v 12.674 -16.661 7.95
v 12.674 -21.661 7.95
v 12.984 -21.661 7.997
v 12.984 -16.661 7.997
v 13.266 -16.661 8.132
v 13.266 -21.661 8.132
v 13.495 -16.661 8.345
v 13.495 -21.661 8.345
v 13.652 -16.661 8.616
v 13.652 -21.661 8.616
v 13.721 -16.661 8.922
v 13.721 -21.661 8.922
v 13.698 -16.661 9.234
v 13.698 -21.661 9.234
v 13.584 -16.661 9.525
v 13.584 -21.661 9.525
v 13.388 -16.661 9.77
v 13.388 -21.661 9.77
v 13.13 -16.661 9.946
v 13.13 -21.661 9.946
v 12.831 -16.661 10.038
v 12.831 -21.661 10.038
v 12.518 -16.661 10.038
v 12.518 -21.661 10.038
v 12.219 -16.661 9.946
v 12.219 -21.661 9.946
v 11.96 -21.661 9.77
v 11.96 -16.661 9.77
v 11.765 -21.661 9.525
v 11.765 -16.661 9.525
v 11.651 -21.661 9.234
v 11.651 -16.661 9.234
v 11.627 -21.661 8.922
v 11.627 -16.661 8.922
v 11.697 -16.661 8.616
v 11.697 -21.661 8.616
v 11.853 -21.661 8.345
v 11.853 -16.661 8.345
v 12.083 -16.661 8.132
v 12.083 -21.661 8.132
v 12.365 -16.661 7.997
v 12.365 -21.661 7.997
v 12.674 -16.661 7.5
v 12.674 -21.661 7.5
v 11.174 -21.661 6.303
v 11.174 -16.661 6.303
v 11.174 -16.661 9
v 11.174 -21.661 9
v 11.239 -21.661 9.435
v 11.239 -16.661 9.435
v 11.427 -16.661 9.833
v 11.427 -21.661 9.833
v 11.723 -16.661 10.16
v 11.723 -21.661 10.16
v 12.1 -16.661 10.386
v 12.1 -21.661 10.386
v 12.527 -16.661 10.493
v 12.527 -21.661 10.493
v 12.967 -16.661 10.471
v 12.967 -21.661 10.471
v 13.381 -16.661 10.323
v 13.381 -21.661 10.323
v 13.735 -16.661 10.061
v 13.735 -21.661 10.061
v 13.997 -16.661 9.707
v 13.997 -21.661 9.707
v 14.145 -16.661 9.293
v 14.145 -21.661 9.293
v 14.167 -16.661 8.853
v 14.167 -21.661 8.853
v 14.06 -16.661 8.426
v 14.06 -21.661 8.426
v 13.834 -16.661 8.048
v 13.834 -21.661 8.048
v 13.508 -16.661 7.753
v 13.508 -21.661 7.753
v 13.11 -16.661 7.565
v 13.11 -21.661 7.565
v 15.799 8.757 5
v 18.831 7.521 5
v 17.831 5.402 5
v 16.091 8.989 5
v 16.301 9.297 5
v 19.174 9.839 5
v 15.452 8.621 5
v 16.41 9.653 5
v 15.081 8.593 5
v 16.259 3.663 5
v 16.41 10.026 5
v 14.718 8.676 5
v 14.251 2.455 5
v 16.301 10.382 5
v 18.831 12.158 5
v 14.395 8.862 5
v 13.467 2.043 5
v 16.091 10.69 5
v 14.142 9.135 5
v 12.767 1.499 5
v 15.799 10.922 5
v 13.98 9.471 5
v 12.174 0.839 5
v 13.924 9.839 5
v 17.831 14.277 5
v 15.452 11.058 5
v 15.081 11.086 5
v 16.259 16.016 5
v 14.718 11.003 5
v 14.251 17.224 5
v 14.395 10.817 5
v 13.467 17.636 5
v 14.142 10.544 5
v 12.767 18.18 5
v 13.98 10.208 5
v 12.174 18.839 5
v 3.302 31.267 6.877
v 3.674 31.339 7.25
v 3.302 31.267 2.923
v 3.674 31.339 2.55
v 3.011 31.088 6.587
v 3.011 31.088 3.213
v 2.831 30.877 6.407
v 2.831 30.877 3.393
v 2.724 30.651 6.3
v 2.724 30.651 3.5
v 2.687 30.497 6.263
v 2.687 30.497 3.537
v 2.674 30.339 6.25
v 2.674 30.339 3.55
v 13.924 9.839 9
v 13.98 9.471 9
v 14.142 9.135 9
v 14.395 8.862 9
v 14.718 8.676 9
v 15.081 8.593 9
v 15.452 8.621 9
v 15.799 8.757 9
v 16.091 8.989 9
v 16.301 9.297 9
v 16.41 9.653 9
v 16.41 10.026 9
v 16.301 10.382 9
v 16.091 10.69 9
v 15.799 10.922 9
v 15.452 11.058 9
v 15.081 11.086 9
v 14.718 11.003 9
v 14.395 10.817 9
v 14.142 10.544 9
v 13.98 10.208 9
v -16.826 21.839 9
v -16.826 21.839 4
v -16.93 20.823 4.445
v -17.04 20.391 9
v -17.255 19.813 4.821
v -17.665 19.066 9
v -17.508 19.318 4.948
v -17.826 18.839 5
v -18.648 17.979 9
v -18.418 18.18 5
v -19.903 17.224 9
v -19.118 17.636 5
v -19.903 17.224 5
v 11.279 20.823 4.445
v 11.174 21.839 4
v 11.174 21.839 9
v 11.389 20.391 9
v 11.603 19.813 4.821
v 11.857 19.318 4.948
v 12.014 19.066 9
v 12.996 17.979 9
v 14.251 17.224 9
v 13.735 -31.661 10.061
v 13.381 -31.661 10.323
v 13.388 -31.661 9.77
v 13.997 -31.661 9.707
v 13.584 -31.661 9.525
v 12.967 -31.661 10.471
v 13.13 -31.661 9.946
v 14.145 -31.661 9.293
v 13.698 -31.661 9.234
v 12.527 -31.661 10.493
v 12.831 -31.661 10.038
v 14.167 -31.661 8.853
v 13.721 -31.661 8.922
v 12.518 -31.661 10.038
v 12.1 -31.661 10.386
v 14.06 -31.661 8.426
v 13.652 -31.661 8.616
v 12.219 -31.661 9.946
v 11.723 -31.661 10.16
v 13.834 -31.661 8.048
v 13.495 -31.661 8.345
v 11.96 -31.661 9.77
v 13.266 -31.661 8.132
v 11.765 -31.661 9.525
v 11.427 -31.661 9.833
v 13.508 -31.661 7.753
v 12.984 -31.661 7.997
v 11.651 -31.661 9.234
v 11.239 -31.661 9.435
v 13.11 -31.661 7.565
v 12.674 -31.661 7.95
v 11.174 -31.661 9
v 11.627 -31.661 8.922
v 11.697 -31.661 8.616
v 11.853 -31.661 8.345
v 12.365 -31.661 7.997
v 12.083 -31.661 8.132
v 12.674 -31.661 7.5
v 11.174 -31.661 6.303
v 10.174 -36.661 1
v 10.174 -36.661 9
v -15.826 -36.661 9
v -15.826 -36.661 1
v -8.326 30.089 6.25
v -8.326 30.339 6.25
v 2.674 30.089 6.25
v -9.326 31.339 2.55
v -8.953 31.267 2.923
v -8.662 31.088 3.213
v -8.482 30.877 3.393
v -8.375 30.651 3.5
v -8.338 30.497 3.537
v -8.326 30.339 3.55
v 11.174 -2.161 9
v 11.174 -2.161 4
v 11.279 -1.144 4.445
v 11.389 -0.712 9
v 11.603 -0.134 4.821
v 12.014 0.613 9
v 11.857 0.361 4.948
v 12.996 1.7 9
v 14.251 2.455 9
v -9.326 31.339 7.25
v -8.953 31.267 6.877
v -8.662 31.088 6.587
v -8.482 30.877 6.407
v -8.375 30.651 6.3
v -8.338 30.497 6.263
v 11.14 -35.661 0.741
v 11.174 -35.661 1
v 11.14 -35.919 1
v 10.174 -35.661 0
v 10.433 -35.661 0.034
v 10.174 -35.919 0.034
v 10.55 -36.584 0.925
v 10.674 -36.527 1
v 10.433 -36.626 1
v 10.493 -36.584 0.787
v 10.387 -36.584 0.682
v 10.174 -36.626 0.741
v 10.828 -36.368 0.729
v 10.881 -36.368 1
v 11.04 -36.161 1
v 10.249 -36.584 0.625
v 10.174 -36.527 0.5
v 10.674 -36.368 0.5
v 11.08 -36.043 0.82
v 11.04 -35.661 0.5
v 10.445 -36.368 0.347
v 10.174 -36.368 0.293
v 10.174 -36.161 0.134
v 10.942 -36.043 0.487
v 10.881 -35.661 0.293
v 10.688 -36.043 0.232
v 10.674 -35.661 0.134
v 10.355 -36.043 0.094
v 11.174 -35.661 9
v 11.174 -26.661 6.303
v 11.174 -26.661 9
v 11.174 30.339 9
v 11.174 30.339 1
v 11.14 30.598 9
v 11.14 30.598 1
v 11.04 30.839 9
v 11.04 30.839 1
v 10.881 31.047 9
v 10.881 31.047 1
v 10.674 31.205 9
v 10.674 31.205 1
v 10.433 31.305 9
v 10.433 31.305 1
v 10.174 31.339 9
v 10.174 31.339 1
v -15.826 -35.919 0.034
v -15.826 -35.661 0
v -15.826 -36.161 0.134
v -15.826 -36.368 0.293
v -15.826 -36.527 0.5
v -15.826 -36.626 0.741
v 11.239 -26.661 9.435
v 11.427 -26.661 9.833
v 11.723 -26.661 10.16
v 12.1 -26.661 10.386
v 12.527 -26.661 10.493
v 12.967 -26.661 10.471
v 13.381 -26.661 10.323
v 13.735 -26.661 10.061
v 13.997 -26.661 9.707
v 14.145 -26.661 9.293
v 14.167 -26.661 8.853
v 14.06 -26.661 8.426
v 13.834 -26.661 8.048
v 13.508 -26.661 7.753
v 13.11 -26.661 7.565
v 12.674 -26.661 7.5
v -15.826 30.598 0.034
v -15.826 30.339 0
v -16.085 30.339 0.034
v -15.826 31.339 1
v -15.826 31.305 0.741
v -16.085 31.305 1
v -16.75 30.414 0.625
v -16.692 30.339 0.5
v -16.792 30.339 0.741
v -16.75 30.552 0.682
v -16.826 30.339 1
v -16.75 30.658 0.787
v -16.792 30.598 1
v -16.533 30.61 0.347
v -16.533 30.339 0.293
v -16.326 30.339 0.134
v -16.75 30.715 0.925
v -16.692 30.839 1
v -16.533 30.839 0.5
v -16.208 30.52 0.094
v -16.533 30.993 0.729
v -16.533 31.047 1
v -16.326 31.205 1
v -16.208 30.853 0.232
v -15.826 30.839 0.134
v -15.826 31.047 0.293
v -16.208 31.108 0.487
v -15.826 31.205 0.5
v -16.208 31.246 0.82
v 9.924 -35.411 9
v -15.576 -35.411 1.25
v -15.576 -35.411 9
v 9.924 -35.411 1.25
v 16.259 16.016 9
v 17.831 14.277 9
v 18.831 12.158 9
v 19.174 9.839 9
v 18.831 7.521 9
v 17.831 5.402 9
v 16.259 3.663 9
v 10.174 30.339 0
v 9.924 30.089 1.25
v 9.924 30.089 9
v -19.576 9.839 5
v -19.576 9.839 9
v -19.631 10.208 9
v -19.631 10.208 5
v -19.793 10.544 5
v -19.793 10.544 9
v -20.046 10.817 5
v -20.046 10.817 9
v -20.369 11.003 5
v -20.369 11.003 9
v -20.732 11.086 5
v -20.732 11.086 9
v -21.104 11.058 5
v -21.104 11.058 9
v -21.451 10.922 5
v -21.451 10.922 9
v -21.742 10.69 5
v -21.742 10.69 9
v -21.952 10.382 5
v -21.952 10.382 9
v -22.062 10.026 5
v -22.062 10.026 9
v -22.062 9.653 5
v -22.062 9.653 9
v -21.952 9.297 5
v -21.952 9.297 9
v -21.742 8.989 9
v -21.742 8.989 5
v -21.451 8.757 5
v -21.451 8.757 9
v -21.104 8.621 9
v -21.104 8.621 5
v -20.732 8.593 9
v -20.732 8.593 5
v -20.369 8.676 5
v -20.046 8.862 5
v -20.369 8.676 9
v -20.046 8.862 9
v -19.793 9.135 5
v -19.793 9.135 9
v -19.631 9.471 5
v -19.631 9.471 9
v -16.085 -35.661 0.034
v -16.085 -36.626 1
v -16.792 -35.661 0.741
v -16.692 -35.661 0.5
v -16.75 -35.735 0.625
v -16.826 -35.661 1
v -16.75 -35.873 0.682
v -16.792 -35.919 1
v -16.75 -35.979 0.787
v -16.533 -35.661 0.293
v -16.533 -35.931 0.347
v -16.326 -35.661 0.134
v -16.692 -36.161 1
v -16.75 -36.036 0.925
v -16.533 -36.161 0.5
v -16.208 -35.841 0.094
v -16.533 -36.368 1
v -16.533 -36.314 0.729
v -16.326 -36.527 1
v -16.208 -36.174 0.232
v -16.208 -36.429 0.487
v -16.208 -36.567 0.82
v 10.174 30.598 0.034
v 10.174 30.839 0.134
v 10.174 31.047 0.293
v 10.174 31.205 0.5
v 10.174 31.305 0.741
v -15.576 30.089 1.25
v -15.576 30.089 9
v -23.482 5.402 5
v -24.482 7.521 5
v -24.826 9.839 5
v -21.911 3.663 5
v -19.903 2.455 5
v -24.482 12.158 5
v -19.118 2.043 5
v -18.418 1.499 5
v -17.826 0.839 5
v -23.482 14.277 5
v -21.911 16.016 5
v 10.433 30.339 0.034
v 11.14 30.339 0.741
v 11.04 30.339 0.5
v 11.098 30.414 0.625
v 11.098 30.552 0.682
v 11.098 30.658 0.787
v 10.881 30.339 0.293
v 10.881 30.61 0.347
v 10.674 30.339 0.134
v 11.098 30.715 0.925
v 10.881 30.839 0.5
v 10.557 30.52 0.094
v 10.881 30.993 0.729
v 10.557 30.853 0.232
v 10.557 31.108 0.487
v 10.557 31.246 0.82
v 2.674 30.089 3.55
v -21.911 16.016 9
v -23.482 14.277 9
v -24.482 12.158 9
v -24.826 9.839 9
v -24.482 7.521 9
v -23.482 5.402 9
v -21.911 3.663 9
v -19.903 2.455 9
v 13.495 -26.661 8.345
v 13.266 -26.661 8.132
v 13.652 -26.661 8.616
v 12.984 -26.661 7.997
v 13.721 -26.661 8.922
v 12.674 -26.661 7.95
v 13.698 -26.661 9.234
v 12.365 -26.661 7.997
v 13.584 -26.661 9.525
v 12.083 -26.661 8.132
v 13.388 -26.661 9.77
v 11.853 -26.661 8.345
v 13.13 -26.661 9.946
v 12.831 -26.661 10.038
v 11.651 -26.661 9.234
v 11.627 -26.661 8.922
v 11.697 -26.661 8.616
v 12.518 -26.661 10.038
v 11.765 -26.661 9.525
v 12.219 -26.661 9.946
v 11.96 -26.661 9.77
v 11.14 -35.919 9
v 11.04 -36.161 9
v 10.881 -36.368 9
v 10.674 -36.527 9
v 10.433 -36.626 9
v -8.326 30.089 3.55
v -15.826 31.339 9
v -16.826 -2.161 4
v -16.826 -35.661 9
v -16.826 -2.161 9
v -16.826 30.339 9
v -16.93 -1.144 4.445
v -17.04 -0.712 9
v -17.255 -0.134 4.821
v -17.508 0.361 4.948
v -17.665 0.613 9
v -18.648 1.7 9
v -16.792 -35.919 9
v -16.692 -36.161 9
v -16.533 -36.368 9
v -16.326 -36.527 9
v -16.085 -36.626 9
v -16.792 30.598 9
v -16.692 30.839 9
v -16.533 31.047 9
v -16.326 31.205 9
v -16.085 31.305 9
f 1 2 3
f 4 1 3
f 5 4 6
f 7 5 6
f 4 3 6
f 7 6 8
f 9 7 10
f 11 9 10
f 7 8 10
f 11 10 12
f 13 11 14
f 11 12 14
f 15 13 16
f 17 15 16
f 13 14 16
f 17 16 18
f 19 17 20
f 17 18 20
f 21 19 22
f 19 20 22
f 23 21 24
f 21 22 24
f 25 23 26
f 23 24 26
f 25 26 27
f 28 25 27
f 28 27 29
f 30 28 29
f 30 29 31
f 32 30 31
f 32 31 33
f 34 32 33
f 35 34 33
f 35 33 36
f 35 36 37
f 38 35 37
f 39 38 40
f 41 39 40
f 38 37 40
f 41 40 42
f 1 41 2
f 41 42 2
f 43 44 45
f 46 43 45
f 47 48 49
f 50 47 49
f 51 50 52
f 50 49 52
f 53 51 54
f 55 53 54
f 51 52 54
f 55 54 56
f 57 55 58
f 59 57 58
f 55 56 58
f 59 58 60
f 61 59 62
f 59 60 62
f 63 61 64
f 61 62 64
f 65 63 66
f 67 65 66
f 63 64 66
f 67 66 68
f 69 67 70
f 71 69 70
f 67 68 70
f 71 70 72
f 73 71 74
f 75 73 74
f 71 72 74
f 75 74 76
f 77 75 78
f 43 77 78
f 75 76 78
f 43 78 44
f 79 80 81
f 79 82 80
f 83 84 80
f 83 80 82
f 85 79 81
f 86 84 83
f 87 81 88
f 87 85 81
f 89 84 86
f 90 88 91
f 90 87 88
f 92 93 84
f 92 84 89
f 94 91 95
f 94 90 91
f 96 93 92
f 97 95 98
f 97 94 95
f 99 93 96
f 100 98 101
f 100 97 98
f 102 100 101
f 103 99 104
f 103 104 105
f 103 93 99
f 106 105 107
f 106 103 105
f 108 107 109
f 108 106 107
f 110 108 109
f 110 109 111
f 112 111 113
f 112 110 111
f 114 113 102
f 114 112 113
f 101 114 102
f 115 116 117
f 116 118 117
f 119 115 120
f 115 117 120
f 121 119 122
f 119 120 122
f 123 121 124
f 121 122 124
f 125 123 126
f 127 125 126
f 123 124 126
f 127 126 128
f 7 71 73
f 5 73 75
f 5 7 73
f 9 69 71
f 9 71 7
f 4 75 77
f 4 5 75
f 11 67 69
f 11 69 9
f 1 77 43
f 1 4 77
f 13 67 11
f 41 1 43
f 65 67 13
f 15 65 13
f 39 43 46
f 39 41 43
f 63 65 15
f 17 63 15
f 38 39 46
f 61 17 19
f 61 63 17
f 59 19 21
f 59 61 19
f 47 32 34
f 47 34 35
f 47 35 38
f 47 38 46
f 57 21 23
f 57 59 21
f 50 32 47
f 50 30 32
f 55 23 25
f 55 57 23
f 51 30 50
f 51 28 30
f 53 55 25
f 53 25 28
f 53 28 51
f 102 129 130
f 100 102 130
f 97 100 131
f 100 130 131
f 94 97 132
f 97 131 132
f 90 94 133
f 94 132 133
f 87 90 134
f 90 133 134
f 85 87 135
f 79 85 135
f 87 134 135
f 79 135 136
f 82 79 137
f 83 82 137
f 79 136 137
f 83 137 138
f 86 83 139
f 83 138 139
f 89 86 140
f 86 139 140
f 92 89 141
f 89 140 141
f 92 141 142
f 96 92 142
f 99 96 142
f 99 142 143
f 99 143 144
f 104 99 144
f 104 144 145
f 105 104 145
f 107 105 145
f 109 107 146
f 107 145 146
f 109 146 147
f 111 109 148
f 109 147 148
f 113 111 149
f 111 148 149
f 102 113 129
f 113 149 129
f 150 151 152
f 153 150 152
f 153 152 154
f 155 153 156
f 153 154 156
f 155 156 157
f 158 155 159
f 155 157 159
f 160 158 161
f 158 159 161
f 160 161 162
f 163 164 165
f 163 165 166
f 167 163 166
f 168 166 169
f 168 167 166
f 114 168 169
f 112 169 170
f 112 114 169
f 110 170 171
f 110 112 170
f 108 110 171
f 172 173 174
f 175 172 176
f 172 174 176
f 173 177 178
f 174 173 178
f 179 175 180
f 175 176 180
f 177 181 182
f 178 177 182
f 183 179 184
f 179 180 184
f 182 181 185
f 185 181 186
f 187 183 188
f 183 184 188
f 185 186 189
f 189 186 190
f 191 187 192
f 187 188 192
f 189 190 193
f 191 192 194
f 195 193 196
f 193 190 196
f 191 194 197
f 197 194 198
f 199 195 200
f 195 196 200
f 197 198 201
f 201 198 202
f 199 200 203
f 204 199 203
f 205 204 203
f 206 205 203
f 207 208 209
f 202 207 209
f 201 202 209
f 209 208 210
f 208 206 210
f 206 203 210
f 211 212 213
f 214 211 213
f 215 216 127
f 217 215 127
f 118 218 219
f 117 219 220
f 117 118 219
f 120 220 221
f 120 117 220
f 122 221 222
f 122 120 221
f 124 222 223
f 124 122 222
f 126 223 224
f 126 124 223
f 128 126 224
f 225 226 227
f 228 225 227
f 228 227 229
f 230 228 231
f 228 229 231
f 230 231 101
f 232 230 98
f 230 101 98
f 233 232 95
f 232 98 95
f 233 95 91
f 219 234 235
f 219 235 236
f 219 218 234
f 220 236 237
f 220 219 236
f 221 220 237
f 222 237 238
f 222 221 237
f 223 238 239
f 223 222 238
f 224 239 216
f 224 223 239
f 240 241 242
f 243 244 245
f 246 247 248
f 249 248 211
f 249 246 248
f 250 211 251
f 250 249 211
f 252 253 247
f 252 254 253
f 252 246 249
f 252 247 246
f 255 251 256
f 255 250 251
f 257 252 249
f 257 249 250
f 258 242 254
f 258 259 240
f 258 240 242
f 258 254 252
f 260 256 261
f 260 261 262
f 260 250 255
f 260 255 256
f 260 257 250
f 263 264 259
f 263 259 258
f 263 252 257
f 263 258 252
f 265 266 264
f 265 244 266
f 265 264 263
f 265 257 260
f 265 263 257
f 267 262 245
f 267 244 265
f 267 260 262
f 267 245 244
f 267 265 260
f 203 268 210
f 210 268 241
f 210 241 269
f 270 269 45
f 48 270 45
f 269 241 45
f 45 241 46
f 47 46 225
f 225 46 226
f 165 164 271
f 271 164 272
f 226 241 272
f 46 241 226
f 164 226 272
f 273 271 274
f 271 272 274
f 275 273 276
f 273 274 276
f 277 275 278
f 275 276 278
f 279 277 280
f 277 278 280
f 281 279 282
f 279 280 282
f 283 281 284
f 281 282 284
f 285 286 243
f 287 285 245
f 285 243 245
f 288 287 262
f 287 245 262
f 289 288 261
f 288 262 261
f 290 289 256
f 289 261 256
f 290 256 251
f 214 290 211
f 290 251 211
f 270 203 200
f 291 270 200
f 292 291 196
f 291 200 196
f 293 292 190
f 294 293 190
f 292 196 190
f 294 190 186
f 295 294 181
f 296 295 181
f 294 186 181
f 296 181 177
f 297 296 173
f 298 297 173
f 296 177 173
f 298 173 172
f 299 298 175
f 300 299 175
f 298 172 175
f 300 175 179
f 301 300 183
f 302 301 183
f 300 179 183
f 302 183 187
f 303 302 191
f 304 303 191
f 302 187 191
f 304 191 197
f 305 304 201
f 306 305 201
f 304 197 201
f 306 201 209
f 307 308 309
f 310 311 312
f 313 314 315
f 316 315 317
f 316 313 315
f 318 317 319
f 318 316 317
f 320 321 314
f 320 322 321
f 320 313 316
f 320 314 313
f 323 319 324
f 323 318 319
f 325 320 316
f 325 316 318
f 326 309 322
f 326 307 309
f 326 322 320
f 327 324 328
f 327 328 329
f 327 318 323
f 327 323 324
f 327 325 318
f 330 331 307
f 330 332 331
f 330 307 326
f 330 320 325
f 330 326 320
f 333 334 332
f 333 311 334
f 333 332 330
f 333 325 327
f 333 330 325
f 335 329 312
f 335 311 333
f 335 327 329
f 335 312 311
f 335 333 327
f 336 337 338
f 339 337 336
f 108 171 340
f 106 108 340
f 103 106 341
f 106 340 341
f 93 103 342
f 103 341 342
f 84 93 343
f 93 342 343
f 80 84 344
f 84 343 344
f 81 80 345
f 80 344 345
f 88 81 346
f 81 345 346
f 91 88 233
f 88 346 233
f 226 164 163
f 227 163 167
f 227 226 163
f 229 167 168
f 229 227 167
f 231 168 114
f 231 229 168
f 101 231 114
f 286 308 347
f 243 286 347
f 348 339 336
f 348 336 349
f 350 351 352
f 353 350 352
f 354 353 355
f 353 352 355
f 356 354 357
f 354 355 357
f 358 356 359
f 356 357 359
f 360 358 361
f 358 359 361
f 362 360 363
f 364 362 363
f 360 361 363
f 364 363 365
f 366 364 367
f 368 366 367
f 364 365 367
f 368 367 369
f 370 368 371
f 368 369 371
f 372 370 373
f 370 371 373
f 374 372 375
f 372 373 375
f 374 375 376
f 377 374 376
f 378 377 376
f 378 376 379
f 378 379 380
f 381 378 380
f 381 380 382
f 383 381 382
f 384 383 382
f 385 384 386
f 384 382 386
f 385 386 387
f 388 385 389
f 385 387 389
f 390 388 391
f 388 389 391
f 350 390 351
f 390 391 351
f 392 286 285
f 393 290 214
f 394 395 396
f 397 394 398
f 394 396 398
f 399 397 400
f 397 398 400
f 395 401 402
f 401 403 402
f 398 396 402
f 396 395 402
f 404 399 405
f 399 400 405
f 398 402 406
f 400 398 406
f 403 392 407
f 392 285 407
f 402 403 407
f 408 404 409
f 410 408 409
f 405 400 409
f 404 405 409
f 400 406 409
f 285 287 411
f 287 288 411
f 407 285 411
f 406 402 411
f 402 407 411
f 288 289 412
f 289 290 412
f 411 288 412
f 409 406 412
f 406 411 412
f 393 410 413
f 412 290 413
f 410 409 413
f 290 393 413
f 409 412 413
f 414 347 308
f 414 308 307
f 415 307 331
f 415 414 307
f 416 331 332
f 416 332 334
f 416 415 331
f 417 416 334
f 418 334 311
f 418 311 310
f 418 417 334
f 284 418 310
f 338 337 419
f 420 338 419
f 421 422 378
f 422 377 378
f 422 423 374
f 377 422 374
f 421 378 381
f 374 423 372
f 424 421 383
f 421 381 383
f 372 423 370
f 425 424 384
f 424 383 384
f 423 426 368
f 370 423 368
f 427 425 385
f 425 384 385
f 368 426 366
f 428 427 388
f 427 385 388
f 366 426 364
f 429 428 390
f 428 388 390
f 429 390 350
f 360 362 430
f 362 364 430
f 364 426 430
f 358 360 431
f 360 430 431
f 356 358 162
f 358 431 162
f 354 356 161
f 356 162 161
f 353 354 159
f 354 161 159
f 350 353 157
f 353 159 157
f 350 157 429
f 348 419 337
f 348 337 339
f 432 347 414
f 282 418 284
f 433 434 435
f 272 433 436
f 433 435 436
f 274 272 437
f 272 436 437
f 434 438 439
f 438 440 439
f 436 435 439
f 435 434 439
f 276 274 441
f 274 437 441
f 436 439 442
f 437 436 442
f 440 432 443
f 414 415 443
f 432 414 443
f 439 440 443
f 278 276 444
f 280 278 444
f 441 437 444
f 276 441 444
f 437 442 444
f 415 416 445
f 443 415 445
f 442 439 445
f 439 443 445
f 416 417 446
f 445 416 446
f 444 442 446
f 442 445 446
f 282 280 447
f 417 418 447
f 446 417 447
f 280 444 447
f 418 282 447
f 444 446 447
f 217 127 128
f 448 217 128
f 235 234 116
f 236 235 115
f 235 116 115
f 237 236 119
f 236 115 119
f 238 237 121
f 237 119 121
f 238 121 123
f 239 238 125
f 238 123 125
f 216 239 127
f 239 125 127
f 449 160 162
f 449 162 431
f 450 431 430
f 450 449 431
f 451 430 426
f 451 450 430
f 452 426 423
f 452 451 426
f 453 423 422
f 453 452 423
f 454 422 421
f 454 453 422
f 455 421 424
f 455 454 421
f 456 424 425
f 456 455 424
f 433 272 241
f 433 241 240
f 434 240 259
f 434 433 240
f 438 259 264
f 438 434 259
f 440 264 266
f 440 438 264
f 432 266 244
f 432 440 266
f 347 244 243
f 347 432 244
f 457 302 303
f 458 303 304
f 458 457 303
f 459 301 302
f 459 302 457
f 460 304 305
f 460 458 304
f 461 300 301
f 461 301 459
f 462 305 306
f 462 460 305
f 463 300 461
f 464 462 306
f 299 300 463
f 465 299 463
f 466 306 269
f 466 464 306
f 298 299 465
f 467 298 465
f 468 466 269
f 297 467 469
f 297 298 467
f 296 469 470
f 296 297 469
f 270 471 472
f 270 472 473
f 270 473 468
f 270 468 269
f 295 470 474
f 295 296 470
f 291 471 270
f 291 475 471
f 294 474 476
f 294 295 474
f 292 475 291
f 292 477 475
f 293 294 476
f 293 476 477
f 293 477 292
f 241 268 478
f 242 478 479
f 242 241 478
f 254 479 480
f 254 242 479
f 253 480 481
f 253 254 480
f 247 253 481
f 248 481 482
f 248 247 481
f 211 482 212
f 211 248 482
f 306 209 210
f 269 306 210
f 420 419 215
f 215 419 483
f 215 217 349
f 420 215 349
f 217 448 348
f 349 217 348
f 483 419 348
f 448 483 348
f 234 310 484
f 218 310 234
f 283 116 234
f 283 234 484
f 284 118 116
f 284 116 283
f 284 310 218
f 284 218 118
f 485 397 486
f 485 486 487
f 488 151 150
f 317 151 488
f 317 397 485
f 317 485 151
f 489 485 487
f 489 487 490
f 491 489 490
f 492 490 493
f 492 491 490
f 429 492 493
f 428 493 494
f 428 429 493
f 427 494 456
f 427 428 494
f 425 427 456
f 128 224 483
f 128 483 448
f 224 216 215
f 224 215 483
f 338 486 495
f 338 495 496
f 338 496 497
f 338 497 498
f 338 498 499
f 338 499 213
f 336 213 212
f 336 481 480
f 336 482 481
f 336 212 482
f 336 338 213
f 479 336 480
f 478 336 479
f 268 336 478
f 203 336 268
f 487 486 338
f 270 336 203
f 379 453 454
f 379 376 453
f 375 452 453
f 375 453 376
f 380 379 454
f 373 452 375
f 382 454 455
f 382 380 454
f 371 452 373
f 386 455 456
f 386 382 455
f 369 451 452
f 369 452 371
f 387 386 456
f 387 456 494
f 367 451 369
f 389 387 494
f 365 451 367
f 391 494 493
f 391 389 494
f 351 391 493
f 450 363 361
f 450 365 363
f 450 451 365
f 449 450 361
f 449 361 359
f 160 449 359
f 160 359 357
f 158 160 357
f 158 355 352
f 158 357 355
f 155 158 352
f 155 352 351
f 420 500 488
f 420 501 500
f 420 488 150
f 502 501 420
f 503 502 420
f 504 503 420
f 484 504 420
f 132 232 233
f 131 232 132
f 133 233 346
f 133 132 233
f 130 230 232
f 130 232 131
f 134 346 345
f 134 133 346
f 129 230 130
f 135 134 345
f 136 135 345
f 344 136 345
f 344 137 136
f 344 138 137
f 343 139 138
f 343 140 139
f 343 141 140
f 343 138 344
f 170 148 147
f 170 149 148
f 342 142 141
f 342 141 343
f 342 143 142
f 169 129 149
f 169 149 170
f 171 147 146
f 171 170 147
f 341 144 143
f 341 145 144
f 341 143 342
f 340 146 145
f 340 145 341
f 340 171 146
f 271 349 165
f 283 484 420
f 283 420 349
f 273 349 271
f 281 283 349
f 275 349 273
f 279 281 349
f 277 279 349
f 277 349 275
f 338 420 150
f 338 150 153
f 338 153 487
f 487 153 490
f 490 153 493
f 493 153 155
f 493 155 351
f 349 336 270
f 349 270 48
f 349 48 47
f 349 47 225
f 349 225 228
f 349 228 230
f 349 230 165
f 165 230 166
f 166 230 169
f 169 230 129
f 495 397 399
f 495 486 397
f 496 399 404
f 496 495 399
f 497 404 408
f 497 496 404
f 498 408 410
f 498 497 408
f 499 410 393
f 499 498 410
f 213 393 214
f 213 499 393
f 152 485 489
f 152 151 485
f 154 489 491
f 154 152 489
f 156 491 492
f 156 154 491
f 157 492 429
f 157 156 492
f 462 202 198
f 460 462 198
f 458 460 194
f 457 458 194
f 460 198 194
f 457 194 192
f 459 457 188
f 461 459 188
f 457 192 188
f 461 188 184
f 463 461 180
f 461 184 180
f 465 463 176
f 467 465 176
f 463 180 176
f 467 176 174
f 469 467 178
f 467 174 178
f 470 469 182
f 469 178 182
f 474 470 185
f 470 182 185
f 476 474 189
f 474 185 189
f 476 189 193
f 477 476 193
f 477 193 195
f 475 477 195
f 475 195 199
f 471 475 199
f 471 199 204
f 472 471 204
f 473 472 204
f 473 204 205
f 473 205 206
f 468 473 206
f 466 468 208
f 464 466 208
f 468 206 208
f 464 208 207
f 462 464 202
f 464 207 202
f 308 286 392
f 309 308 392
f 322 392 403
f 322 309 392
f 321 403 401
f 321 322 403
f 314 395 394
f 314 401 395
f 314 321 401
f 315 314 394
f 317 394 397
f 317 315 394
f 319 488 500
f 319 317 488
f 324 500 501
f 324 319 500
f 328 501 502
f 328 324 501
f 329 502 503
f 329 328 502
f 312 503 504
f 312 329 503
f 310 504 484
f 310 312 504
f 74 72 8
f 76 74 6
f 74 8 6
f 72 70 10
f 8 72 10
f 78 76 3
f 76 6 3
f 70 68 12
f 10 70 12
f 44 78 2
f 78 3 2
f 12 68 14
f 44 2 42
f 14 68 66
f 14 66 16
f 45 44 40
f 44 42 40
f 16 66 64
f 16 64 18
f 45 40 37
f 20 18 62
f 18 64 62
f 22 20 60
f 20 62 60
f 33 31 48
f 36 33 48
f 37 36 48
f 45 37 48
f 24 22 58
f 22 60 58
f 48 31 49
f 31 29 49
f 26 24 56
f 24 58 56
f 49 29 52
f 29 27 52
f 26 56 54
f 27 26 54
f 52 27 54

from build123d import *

# Parameters (mm, degrees)
SKETCH1_W           = 28
SKETCH1_H           = 68
BOSS_EXTRUDE1_DEPTH = 1.25
SKETCH7_W           = 28
SKETCH7_H           = 68
SKETCH7_W_2         = 25.5
SKETCH7_H_2         = 65.5
BOSS_EXTRUDE4_DEPTH = 7.75
SKETCH18_W          = 11
SKETCH18_H          = 2.7
CUT_EXTRUDE10_DEPTH = 1.25
SKETCH13_R          = 1.05
BOSS_EXTRUDE7_DEPTH = 5
LPATTERN2_COUNT     = 4
LPATTERN2_PITCH     = 5
SKETCH14_W          = 10
SKETCH14_H          = 5
CUT_EXTRUDE5_DEPTH  = 5
FILLET1_R           = 1
SKETCH6_R           = 1.25
BOSS_EXTRUDE3_DEPTH = 4
FILLET3_R           = 5
FILLET4_R           = 1
FILLET7_R           = 1


with BuildPart() as part:
    # Sketch1 → Boss-Extrude1 (new body)
    with BuildSketch(Plane.XY):
        with Locations((-2.825688073, -2.660550459)):
            Rectangle(SKETCH1_W, SKETCH1_H)
    extrude(amount=BOSS_EXTRUDE1_DEPTH)

    # Sketch7 → Boss-Extrude4 (add)
    with BuildSketch(Plane.XY.offset(1.25)):
        with Locations((-2.825688073, -2.660550459)):
            Rectangle(SKETCH7_W, SKETCH7_H)
        with Locations((-2.825688073, -2.660550459)):
            Rectangle(SKETCH7_W_2, SKETCH7_H_2, mode=Mode.SUBTRACT)
    extrude(amount=BOSS_EXTRUDE4_DEPTH)

    # Sketch18 → Cut-Extrude10 (cut)
    with BuildSketch(Plane(origin=(0, 31.339449541, 0), x_dir=(1, 0, 0), z_dir=(0, 1, 0))):
        with Locations((-2.825688073, -4.9)):
            Rectangle(SKETCH18_W, SKETCH18_H)
    extrude(amount=-CUT_EXTRUDE10_DEPTH, mode=Mode.SUBTRACT)

    # Sketch13 → Boss-Extrude7 (add)
    with BuildSketch(Plane.XZ.offset(36.660550459)):
        with BuildLine():
            Line((12.674311927, 7.5), (11.174311927, 6.303164343))
            Line((11.174311927, 6.303164343), (11.174311927, 9))
            ThreePointArc((11.174311927, 9), (13.734972098, 10.060660172), (12.674311927, 7.5))
        make_face()
        with Locations(Location((12.674311927, 9, 0), (0, 0, 270))):
            Circle(SKETCH13_R, mode=Mode.SUBTRACT)
    boss_extrude7 = extrude(amount=-BOSS_EXTRUDE7_DEPTH)

    # LPattern2: Boss-Extrude7 ×4, 1 skipped
    with Locations(*[(0, i * LPATTERN2_PITCH, 0) for i in range(1, LPATTERN2_COUNT) if i not in (2,)]):
        add(boss_extrude7)

    # Sketch14 → Cut-Extrude5 (cut)
    with BuildSketch(Plane(origin=(11.174311927, 0, 0), x_dir=(0, 0, -1), z_dir=(1, 0, 0))):
        with Locations((-8.964747177, -34.160550459)):
            Rectangle(SKETCH14_W, SKETCH14_H)
    extrude(amount=CUT_EXTRUDE5_DEPTH, mode=Mode.SUBTRACT)

    # Fillet1
    fillet1_edges = [part.edges().sort_by_distance(p)[0] for p in [
        (-2.825688073, 31.339449541, 0),
        (11.174311927, -2.660550459, 0),
        (11.174311927, -36.660550459, 4.5),
        (-2.825688073, -36.660550459, 0),
        (-16.825688073, -2.660550459, 0),
        (-16.825688073, 31.339449541, 4.5),
        (11.174311927, 31.339449541, 4.5),
        (-16.825688073, -36.660550459, 4.5),
    ]]
    fillet(fillet1_edges, radius=FILLET1_R)

    # Sketch6 → Boss-Extrude3 (add)
    # profile 1 of 2: a face of its own
    with BuildSketch(Plane.XY.offset(9)):
        with BuildLine():
            Line((-16.825688073, 1.839449541), (-16.825688073, 17.839449541))
            ThreePointArc((-16.825688073, 17.839449541), (-24.825688073, 9.839449541), (-16.825688073, 1.839449541))
        make_face()
        with Locations((-20.825688073, 9.839449541)):
            Circle(SKETCH6_R, mode=Mode.SUBTRACT)
    # profile 2 of 2: a face of its own
    with BuildSketch(Plane.XY.offset(9)):
        with BuildLine():
            Line((11.174311927, 1.839449541), (11.174311927, 17.839449541))
            ThreePointArc((11.174311927, 17.839449541), (19.174311927, 9.839449541), (11.174311927, 1.839449541))
        make_face()
        with Locations(Location((15.174311927, 9.839449541, 0), (0, 0, 180))):
            Circle(SKETCH6_R, mode=Mode.SUBTRACT)
    extrude(amount=-BOSS_EXTRUDE3_DEPTH)

    # Fillet3
    fillet3_edges = [part.edges().sort_by_distance(p)[0] for p in [
        (-16.825688073, 1.839449541, 7),
        (-16.825688073, 17.839449541, 7),
        (11.174311927, 17.839449541, 7),
        (11.174311927, 1.839449541, 7),
    ]]
    fillet(fillet3_edges, radius=FILLET3_R)

    # Fillet4
    fillet4_edges = [part.edges().sort_by_distance(p)[0] for p in [
        (-16.825688073, 9.839449541, 5),
        (11.174311927, 9.839449541, 5),
    ]]
    fillet(fillet4_edges, radius=FILLET4_R)

    # Fillet7
    fillet7_edges = [part.edges().sort_by_distance(p)[0] for p in [
        (2.674311927, 31.339449541, 4.9),
        (-2.825688073, 31.339449541, 3.55),
        (-8.325688073, 31.339449541, 4.9),
        (-2.825688073, 31.339449541, 6.25),
    ]]
    fillet(fillet7_edges, radius=FILLET7_R)


solid = part.part
